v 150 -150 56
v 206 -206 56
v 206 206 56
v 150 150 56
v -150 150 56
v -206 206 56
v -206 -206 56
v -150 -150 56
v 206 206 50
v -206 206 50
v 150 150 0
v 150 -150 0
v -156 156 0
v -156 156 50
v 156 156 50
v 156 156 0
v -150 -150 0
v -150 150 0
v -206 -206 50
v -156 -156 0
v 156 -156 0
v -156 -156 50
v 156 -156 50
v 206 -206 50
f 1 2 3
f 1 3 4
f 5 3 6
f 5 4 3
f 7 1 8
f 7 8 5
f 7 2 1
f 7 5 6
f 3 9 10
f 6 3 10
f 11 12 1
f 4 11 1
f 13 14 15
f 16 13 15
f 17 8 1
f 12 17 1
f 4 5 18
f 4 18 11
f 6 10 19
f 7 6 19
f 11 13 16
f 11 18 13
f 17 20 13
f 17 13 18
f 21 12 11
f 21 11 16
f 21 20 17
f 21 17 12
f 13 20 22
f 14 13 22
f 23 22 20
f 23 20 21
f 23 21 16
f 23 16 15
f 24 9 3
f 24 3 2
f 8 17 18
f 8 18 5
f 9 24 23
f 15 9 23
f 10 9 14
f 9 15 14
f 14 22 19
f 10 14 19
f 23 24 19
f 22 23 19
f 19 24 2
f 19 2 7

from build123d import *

# Parameters (mm, degrees)
SKETCH051_W  = 300
SKETCH051_H  = 60
PAD_DEPTH    = 150
SKETCH052_W  = 312
SKETCH052_H  = 50
PAD001_DEPTH = 156
SKETCH053_W  = 412
SKETCH053_H  = 412
PAD002_DEPTH = 6


with BuildPart() as body:
    # Sketch051 → Pad (new body, symmetric)
    with BuildSketch(Plane.XZ):
        with Locations((0, 30)):
            Rectangle(SKETCH051_W, SKETCH051_H)
    extrude(amount=PAD_DEPTH, both=True)


with BuildPart() as cut006:
    # Sketch052 → Pad001 (new body, symmetric)
    with BuildSketch(Plane.XZ):
        with Locations((0, 25)):
            Rectangle(SKETCH052_W, SKETCH052_H)
    extrude(amount=PAD001_DEPTH, both=True)

    # Sketch053 (on Face3 of Pad001) → Pad002 (join)
    with BuildSketch(Plane(origin=(0, 0, 50), x_dir=(-1, 0, 0), z_dir=(0, 0, 1))):
        Rectangle(SKETCH053_W, SKETCH053_H)
    extrude(amount=PAD002_DEPTH)

    # Cut006: cut Body
    add(body.part, mode=Mode.SUBTRACT)


solid = cut006.part
